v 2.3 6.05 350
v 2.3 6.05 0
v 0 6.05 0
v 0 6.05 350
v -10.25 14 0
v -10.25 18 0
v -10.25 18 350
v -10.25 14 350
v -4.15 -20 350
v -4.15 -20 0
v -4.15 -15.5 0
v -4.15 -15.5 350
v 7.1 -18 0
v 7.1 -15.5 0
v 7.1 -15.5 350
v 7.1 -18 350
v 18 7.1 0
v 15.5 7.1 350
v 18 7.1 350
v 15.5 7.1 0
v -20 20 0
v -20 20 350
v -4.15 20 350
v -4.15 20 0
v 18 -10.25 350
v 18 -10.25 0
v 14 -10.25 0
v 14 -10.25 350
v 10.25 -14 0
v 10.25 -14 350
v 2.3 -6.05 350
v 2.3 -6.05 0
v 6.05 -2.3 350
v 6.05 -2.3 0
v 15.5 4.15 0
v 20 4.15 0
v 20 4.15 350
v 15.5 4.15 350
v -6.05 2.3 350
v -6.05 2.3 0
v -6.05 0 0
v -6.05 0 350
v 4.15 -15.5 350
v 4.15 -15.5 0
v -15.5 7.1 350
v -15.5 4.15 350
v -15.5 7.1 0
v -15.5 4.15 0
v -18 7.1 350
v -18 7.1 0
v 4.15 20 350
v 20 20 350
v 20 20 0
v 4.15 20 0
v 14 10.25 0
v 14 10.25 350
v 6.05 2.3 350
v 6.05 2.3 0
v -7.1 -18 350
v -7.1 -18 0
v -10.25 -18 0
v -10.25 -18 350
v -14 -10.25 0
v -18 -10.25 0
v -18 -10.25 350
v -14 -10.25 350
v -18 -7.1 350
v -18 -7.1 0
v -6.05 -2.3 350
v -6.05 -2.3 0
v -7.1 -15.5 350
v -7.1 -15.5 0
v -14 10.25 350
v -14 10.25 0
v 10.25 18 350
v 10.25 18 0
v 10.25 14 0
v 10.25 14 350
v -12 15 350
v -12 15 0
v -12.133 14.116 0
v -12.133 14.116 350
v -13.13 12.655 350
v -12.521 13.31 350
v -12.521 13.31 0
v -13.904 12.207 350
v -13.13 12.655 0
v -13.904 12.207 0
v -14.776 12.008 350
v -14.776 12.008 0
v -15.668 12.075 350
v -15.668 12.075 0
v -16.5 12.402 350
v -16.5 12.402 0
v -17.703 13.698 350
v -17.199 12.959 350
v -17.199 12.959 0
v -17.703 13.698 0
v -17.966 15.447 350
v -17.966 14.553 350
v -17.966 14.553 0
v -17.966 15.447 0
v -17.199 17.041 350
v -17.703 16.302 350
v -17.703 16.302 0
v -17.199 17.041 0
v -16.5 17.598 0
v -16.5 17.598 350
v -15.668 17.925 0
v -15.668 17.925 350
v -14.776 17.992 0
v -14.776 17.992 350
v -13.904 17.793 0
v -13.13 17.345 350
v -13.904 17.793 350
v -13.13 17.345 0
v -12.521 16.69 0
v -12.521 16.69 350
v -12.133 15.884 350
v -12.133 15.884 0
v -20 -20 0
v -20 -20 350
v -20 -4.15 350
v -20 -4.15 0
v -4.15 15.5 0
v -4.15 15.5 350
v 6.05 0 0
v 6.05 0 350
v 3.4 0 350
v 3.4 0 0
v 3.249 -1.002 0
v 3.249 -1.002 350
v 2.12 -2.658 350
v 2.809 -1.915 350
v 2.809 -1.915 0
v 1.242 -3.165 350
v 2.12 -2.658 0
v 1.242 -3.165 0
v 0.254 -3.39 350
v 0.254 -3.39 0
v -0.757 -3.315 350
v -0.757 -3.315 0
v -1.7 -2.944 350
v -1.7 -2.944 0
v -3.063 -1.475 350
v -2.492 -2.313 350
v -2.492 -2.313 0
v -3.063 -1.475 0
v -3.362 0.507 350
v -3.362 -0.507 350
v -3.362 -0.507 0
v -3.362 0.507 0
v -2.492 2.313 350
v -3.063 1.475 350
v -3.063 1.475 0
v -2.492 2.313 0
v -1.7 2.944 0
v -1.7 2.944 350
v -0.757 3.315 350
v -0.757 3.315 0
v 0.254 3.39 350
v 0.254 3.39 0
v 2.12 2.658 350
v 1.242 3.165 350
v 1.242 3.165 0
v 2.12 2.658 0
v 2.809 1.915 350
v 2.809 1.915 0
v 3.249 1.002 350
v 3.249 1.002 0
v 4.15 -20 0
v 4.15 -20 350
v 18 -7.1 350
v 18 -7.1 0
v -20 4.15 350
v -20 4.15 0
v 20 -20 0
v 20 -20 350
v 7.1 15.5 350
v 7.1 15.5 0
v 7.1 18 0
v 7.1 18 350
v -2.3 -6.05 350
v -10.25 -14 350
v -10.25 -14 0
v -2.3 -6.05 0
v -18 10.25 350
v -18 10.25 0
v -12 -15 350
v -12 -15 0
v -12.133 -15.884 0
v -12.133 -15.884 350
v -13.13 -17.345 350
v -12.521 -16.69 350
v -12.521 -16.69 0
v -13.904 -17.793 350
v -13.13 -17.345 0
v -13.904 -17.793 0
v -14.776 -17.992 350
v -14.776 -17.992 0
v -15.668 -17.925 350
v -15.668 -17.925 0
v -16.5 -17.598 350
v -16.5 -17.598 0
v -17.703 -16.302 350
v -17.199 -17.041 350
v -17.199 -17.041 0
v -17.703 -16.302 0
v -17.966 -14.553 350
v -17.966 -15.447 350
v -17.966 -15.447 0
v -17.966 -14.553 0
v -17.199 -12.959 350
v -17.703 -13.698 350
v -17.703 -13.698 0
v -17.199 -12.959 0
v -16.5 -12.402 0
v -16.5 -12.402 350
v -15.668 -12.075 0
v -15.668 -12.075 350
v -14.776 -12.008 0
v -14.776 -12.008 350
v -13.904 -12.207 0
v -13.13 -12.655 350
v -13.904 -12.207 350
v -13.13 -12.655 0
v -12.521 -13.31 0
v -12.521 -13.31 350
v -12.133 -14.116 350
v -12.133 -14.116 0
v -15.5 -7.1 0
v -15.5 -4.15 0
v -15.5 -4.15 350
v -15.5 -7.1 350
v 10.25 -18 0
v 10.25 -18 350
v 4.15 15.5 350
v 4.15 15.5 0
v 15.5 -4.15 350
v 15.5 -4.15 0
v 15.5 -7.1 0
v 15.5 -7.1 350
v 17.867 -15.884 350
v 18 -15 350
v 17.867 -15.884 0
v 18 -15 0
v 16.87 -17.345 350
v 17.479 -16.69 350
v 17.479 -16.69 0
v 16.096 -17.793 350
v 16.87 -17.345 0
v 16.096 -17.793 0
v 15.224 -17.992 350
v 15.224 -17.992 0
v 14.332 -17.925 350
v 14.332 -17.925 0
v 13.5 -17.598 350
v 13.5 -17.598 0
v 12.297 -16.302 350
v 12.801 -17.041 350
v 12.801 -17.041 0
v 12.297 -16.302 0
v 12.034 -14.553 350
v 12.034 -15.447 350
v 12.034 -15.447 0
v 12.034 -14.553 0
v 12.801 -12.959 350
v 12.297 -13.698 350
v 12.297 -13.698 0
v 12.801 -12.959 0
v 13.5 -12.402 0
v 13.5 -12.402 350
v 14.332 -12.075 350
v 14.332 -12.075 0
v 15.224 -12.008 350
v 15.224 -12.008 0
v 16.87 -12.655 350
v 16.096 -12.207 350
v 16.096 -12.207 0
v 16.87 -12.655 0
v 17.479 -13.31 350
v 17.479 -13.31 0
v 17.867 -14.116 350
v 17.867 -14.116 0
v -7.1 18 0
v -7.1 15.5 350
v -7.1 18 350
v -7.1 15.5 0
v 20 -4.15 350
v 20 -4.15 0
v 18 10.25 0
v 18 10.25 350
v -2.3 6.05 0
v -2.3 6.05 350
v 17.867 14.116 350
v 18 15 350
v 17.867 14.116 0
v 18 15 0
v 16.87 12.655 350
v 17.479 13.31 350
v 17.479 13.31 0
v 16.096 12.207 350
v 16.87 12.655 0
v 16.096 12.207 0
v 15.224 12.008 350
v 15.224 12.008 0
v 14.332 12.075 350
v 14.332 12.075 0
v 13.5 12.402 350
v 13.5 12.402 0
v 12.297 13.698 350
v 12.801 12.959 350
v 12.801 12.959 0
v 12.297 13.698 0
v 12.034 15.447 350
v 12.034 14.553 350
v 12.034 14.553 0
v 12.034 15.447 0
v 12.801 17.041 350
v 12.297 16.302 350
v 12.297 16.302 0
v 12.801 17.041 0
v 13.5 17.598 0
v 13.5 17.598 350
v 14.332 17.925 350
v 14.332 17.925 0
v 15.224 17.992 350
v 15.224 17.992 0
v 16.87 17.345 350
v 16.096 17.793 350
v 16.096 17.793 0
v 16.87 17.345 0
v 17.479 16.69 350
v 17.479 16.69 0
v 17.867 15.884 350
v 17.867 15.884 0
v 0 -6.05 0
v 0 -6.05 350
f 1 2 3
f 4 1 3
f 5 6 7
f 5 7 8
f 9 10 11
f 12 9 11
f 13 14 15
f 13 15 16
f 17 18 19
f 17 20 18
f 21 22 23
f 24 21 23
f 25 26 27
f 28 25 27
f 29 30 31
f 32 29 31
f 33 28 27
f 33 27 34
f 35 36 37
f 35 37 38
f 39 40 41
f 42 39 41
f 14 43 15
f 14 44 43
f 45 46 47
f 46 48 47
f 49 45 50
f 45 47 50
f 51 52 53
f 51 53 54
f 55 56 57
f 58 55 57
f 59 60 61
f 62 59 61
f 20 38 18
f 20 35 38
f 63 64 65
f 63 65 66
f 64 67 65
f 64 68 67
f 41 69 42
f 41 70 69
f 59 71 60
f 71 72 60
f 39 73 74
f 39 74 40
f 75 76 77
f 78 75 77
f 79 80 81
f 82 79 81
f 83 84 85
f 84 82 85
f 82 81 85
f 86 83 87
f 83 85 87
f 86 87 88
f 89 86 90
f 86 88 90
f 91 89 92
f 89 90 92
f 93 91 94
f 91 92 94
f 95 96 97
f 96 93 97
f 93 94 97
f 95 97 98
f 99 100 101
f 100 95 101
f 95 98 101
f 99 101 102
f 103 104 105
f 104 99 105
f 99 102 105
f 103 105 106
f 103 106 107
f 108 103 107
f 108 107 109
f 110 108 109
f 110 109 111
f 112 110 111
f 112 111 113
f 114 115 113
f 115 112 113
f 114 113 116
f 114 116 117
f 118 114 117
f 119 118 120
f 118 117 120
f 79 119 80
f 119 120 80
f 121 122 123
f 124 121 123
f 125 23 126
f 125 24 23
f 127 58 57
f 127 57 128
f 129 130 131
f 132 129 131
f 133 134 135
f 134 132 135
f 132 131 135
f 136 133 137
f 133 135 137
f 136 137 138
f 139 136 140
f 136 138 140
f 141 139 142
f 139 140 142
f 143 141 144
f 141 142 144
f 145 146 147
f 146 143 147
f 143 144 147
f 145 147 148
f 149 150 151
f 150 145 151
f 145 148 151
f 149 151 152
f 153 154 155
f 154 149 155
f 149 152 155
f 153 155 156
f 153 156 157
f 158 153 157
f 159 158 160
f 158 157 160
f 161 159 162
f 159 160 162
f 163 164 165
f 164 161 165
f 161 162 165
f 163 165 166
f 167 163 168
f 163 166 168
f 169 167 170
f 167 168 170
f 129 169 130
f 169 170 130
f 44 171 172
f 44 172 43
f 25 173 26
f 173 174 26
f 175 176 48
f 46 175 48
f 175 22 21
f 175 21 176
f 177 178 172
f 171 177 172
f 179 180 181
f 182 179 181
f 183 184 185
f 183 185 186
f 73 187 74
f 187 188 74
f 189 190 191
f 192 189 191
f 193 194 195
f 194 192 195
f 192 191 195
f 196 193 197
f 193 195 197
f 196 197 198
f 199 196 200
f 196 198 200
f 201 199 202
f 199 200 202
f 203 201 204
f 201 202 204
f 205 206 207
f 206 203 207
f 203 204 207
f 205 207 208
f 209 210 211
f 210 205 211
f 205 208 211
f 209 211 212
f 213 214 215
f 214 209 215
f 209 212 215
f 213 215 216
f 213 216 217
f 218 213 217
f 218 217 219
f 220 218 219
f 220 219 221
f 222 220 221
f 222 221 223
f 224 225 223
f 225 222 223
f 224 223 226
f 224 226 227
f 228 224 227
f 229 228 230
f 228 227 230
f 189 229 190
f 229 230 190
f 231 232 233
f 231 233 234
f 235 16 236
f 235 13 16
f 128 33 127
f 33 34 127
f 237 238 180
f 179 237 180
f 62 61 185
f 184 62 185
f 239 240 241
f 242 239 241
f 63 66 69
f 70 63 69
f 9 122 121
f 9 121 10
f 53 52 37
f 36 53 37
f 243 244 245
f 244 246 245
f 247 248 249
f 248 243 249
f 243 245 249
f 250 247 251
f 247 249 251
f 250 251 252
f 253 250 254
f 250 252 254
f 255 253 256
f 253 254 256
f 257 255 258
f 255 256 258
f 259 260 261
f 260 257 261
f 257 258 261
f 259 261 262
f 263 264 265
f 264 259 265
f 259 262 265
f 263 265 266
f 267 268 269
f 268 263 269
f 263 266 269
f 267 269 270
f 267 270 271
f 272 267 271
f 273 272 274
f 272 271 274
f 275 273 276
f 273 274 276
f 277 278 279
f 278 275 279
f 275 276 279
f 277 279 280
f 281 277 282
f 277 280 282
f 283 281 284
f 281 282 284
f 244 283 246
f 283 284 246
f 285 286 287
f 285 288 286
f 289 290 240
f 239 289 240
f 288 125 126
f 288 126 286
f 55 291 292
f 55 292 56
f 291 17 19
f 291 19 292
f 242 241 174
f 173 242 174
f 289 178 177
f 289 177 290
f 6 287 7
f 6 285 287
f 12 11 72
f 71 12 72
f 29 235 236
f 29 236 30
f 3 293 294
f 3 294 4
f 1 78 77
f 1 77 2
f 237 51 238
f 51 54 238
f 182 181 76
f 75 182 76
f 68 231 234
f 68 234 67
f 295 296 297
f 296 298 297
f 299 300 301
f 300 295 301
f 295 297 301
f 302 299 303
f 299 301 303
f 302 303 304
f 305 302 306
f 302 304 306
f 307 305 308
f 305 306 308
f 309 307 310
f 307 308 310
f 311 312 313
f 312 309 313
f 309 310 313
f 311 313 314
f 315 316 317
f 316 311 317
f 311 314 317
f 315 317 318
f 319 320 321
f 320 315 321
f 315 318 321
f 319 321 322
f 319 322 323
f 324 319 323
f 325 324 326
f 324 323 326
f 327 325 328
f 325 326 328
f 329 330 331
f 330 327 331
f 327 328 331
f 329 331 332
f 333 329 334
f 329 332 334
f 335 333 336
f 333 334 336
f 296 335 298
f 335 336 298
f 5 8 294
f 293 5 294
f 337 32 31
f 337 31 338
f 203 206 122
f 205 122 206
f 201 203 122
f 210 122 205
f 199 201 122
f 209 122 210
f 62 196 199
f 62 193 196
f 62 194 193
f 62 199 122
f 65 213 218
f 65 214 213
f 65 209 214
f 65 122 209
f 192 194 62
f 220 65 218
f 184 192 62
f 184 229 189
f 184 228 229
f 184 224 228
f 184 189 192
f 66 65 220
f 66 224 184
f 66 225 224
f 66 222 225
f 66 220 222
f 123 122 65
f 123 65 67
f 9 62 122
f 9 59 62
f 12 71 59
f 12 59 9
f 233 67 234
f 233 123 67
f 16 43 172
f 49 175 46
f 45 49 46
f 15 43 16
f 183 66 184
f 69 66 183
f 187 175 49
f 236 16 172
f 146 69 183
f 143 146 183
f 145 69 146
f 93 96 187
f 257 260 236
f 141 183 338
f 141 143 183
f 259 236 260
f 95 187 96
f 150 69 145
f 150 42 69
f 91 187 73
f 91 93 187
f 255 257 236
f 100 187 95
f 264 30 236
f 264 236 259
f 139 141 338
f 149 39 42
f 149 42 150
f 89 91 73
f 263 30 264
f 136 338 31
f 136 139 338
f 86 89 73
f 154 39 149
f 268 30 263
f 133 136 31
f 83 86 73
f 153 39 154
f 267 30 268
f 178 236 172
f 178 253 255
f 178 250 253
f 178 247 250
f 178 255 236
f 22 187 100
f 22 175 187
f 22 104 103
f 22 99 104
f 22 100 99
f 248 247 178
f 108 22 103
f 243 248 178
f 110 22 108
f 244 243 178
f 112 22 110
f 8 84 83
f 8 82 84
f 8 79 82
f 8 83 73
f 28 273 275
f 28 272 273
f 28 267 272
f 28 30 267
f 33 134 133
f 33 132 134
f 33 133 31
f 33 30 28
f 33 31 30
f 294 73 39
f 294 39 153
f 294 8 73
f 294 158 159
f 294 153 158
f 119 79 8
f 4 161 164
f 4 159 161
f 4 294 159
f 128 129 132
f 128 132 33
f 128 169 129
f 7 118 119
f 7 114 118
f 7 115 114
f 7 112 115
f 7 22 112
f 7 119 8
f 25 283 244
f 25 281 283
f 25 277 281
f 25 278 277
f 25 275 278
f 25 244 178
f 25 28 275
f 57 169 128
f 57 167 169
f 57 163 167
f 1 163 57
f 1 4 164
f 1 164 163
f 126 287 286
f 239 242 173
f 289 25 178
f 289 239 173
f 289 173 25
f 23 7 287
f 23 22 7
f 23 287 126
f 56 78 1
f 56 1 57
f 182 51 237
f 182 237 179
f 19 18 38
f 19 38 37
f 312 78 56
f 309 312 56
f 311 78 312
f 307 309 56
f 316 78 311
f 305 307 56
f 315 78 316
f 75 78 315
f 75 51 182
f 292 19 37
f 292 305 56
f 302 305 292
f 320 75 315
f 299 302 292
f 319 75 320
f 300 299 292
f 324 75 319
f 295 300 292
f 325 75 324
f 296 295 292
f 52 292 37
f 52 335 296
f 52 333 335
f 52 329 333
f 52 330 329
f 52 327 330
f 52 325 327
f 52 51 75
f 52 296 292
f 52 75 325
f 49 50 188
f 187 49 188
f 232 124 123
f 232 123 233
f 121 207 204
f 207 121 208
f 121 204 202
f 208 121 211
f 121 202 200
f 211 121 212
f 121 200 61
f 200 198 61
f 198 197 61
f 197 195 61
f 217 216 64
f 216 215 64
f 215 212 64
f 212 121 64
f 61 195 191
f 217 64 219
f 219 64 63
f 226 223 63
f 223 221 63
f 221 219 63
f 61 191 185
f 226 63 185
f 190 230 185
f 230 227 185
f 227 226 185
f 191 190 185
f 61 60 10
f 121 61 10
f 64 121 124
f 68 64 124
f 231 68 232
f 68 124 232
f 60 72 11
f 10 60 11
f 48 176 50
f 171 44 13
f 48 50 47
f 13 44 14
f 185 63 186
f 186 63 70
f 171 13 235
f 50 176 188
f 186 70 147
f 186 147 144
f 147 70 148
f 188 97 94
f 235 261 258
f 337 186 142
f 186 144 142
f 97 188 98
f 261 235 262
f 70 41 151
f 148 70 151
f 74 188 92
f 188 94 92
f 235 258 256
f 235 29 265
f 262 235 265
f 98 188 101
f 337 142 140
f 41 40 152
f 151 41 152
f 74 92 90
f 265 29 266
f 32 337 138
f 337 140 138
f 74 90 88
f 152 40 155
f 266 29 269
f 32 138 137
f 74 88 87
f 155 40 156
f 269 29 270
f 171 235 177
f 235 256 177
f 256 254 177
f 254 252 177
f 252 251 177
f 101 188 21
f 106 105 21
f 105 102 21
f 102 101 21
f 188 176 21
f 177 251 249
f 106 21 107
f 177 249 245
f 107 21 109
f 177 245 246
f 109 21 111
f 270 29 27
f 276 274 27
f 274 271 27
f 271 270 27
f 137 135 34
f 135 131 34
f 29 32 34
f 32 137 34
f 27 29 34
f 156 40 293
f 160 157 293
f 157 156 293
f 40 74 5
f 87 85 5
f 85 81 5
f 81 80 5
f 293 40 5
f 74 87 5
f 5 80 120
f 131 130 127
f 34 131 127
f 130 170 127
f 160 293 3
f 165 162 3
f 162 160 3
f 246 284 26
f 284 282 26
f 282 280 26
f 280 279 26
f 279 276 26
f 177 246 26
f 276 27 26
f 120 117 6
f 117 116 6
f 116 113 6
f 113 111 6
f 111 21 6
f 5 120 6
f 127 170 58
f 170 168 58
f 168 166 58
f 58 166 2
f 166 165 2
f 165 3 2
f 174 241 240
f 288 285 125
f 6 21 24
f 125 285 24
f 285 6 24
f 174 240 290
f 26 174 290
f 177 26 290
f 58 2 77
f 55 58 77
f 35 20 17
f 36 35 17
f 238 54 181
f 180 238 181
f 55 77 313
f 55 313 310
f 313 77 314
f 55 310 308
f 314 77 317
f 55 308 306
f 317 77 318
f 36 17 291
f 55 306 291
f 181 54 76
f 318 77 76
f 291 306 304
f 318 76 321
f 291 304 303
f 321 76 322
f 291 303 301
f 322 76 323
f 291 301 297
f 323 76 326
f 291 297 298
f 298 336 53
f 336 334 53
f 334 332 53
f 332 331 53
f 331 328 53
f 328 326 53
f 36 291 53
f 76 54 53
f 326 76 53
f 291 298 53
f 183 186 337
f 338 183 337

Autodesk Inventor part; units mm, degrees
ref_plane "YZ Plane" through (0, 0, 0) normal (1, 0, 0) x (0, 1, 0)
ref_plane "XZ Plane" through (0, 0, 0) normal (0, 1, 0) x (-1, 0, 0)
sketch "Sketch1" plane through (0, 0, 0) normal (0, 0, 1) x (1, 0, 0)
  circle A0 centre (0, 0) radius 3.4
  line L0 (0, 0) -> (20, 20) construction
  line L1 (0, 0) -> (28.2843, 0) construction
  line L2 (20, 20) -> (4.15, 20)
  line L3 (4.15, 20) -> (4.15, 15.5)
  line L4 (4.15, 15.5) -> (7.1, 15.5)
  line L5 (7.1, 15.5) -> (7.1, 18)
  line L6 (7.1, 18) -> (10.25, 18)
  line L7 (10.25, 18) -> (10.25, 14)
  line L8 (0, 0) -> (0, 26.1056) construction
  line L9 (10.25, 14) -> (2.3, 6.05)
  line L10 (2.3, 6.05) -> (0, 6.05)
  circle A1 centre (15, 15) radius 3
  line L11 (20, 20) -> (20, 4.15)
  line L12 (20, 4.15) -> (15.5, 4.15)
  line L13 (15.5, 4.15) -> (15.5, 7.1)
  line L14 (15.5, 7.1) -> (18, 7.1)
  line L15 (18, 7.1) -> (18, 10.25)
  line L16 (18, 10.25) -> (14, 10.25)
  line L17 (14, 10.25) -> (6.05, 2.3)
  line L18 (6.05, 2.3) -> (6.05, 0)
  line L19 (-2.3, 6.05) -> (0, 6.05)
  line L20 (-10.25, 14) -> (-2.3, 6.05)
  line L21 (-10.25, 18) -> (-10.25, 14)
  line L22 (-4.15, 15.5) -> (-7.1, 15.5)
  line L23 (-7.1, 15.5) -> (-7.1, 18)
  line L24 (-7.1, 18) -> (-10.25, 18)
  line L25 (-4.15, 20) -> (-4.15, 15.5)
  line L26 (-20, 20) -> (-4.15, 20)
  circle A2 centre (-15, 15) radius 3
  line L27 (-20, 20) -> (-20, 4.15)
  line L28 (-14, 10.25) -> (-6.05, 2.3)
  line L29 (-18, 7.1) -> (-18, 10.25)
  line L30 (-18, 10.25) -> (-14, 10.25)
  line L31 (-20, 4.15) -> (-15.5, 4.15)
  line L32 (-15.5, 4.15) -> (-15.5, 7.1)
  line L33 (-15.5, 7.1) -> (-18, 7.1)
  line L34 (-6.05, 2.3) -> (-6.05, 0)
  line L35 (-6.05, -2.3) -> (-6.05, 0)
  line L36 (-14, -10.25) -> (-6.05, -2.3)
  line L37 (-18, -10.25) -> (-14, -10.25)
  line L38 (-15.5, -4.15) -> (-15.5, -7.1)
  line L39 (-15.5, -7.1) -> (-18, -7.1)
  line L40 (-18, -7.1) -> (-18, -10.25)
  line L41 (-20, -4.15) -> (-15.5, -4.15)
  line L42 (-20, -20) -> (-20, -4.15)
  circle A3 centre (-15, -15) radius 3
  line L43 (-20, -20) -> (-4.15, -20)
  line L44 (-10.25, -14) -> (-2.3, -6.05)
  line L45 (-7.1, -18) -> (-10.25, -18)
  line L46 (-10.25, -18) -> (-10.25, -14)
  line L47 (-4.15, -20) -> (-4.15, -15.5)
  line L48 (-4.15, -15.5) -> (-7.1, -15.5)
  line L49 (-7.1, -15.5) -> (-7.1, -18)
  line L50 (-2.3, -6.05) -> (0, -6.05)
  line L51 (2.3, -6.05) -> (0, -6.05)
  line L52 (10.25, -14) -> (2.3, -6.05)
  line L53 (10.25, -18) -> (10.25, -14)
  line L54 (4.15, -15.5) -> (7.1, -15.5)
  line L55 (7.1, -15.5) -> (7.1, -18)
  line L56 (7.1, -18) -> (10.25, -18)
  line L57 (4.15, -20) -> (4.15, -15.5)
  line L58 (20, -20) -> (4.15, -20)
  circle A4 centre (15, -15) radius 3
  line L59 (20, -20) -> (20, -4.15)
  line L60 (14, -10.25) -> (6.05, -2.3)
  line L61 (18, -7.1) -> (18, -10.25)
  line L62 (18, -10.25) -> (14, -10.25)
  line L63 (20, -4.15) -> (15.5, -4.15)
  line L64 (15.5, -4.15) -> (15.5, -7.1)
  line L65 (15.5, -7.1) -> (18, -7.1)
  line L66 (6.05, -2.3) -> (6.05, 0)
  point P0 (0, 6.05)
  point P1 (-6.05, 0)
  point P2 (0, -6.05)
  dimension "d0" = 6.8
  dimension "d1" = 45
  dimension "d2" = 20
  dimension "d3" = 6
  dimension "d4" = 15
  dimension "d5" = 10.25
  dimension "d6" = 7.1
  dimension "d7" = 4.15
  dimension "d8" = 4.5
  dimension "d9" = 2
  dimension "d10" = 13.95
  dimension "d11" = 6
  dimension "d14" = 360
extrude "Extrusion1" add sketch "Sketch1" along normal blind 350
ref_plane "Work Plane1" through (0, 0, 175) normal (0, 0, 1) x (1, 0, 0)
properties part number "Aluminum_Profile_4040_100.14mm_bottom" material "Aluminum 6061-AHC"
